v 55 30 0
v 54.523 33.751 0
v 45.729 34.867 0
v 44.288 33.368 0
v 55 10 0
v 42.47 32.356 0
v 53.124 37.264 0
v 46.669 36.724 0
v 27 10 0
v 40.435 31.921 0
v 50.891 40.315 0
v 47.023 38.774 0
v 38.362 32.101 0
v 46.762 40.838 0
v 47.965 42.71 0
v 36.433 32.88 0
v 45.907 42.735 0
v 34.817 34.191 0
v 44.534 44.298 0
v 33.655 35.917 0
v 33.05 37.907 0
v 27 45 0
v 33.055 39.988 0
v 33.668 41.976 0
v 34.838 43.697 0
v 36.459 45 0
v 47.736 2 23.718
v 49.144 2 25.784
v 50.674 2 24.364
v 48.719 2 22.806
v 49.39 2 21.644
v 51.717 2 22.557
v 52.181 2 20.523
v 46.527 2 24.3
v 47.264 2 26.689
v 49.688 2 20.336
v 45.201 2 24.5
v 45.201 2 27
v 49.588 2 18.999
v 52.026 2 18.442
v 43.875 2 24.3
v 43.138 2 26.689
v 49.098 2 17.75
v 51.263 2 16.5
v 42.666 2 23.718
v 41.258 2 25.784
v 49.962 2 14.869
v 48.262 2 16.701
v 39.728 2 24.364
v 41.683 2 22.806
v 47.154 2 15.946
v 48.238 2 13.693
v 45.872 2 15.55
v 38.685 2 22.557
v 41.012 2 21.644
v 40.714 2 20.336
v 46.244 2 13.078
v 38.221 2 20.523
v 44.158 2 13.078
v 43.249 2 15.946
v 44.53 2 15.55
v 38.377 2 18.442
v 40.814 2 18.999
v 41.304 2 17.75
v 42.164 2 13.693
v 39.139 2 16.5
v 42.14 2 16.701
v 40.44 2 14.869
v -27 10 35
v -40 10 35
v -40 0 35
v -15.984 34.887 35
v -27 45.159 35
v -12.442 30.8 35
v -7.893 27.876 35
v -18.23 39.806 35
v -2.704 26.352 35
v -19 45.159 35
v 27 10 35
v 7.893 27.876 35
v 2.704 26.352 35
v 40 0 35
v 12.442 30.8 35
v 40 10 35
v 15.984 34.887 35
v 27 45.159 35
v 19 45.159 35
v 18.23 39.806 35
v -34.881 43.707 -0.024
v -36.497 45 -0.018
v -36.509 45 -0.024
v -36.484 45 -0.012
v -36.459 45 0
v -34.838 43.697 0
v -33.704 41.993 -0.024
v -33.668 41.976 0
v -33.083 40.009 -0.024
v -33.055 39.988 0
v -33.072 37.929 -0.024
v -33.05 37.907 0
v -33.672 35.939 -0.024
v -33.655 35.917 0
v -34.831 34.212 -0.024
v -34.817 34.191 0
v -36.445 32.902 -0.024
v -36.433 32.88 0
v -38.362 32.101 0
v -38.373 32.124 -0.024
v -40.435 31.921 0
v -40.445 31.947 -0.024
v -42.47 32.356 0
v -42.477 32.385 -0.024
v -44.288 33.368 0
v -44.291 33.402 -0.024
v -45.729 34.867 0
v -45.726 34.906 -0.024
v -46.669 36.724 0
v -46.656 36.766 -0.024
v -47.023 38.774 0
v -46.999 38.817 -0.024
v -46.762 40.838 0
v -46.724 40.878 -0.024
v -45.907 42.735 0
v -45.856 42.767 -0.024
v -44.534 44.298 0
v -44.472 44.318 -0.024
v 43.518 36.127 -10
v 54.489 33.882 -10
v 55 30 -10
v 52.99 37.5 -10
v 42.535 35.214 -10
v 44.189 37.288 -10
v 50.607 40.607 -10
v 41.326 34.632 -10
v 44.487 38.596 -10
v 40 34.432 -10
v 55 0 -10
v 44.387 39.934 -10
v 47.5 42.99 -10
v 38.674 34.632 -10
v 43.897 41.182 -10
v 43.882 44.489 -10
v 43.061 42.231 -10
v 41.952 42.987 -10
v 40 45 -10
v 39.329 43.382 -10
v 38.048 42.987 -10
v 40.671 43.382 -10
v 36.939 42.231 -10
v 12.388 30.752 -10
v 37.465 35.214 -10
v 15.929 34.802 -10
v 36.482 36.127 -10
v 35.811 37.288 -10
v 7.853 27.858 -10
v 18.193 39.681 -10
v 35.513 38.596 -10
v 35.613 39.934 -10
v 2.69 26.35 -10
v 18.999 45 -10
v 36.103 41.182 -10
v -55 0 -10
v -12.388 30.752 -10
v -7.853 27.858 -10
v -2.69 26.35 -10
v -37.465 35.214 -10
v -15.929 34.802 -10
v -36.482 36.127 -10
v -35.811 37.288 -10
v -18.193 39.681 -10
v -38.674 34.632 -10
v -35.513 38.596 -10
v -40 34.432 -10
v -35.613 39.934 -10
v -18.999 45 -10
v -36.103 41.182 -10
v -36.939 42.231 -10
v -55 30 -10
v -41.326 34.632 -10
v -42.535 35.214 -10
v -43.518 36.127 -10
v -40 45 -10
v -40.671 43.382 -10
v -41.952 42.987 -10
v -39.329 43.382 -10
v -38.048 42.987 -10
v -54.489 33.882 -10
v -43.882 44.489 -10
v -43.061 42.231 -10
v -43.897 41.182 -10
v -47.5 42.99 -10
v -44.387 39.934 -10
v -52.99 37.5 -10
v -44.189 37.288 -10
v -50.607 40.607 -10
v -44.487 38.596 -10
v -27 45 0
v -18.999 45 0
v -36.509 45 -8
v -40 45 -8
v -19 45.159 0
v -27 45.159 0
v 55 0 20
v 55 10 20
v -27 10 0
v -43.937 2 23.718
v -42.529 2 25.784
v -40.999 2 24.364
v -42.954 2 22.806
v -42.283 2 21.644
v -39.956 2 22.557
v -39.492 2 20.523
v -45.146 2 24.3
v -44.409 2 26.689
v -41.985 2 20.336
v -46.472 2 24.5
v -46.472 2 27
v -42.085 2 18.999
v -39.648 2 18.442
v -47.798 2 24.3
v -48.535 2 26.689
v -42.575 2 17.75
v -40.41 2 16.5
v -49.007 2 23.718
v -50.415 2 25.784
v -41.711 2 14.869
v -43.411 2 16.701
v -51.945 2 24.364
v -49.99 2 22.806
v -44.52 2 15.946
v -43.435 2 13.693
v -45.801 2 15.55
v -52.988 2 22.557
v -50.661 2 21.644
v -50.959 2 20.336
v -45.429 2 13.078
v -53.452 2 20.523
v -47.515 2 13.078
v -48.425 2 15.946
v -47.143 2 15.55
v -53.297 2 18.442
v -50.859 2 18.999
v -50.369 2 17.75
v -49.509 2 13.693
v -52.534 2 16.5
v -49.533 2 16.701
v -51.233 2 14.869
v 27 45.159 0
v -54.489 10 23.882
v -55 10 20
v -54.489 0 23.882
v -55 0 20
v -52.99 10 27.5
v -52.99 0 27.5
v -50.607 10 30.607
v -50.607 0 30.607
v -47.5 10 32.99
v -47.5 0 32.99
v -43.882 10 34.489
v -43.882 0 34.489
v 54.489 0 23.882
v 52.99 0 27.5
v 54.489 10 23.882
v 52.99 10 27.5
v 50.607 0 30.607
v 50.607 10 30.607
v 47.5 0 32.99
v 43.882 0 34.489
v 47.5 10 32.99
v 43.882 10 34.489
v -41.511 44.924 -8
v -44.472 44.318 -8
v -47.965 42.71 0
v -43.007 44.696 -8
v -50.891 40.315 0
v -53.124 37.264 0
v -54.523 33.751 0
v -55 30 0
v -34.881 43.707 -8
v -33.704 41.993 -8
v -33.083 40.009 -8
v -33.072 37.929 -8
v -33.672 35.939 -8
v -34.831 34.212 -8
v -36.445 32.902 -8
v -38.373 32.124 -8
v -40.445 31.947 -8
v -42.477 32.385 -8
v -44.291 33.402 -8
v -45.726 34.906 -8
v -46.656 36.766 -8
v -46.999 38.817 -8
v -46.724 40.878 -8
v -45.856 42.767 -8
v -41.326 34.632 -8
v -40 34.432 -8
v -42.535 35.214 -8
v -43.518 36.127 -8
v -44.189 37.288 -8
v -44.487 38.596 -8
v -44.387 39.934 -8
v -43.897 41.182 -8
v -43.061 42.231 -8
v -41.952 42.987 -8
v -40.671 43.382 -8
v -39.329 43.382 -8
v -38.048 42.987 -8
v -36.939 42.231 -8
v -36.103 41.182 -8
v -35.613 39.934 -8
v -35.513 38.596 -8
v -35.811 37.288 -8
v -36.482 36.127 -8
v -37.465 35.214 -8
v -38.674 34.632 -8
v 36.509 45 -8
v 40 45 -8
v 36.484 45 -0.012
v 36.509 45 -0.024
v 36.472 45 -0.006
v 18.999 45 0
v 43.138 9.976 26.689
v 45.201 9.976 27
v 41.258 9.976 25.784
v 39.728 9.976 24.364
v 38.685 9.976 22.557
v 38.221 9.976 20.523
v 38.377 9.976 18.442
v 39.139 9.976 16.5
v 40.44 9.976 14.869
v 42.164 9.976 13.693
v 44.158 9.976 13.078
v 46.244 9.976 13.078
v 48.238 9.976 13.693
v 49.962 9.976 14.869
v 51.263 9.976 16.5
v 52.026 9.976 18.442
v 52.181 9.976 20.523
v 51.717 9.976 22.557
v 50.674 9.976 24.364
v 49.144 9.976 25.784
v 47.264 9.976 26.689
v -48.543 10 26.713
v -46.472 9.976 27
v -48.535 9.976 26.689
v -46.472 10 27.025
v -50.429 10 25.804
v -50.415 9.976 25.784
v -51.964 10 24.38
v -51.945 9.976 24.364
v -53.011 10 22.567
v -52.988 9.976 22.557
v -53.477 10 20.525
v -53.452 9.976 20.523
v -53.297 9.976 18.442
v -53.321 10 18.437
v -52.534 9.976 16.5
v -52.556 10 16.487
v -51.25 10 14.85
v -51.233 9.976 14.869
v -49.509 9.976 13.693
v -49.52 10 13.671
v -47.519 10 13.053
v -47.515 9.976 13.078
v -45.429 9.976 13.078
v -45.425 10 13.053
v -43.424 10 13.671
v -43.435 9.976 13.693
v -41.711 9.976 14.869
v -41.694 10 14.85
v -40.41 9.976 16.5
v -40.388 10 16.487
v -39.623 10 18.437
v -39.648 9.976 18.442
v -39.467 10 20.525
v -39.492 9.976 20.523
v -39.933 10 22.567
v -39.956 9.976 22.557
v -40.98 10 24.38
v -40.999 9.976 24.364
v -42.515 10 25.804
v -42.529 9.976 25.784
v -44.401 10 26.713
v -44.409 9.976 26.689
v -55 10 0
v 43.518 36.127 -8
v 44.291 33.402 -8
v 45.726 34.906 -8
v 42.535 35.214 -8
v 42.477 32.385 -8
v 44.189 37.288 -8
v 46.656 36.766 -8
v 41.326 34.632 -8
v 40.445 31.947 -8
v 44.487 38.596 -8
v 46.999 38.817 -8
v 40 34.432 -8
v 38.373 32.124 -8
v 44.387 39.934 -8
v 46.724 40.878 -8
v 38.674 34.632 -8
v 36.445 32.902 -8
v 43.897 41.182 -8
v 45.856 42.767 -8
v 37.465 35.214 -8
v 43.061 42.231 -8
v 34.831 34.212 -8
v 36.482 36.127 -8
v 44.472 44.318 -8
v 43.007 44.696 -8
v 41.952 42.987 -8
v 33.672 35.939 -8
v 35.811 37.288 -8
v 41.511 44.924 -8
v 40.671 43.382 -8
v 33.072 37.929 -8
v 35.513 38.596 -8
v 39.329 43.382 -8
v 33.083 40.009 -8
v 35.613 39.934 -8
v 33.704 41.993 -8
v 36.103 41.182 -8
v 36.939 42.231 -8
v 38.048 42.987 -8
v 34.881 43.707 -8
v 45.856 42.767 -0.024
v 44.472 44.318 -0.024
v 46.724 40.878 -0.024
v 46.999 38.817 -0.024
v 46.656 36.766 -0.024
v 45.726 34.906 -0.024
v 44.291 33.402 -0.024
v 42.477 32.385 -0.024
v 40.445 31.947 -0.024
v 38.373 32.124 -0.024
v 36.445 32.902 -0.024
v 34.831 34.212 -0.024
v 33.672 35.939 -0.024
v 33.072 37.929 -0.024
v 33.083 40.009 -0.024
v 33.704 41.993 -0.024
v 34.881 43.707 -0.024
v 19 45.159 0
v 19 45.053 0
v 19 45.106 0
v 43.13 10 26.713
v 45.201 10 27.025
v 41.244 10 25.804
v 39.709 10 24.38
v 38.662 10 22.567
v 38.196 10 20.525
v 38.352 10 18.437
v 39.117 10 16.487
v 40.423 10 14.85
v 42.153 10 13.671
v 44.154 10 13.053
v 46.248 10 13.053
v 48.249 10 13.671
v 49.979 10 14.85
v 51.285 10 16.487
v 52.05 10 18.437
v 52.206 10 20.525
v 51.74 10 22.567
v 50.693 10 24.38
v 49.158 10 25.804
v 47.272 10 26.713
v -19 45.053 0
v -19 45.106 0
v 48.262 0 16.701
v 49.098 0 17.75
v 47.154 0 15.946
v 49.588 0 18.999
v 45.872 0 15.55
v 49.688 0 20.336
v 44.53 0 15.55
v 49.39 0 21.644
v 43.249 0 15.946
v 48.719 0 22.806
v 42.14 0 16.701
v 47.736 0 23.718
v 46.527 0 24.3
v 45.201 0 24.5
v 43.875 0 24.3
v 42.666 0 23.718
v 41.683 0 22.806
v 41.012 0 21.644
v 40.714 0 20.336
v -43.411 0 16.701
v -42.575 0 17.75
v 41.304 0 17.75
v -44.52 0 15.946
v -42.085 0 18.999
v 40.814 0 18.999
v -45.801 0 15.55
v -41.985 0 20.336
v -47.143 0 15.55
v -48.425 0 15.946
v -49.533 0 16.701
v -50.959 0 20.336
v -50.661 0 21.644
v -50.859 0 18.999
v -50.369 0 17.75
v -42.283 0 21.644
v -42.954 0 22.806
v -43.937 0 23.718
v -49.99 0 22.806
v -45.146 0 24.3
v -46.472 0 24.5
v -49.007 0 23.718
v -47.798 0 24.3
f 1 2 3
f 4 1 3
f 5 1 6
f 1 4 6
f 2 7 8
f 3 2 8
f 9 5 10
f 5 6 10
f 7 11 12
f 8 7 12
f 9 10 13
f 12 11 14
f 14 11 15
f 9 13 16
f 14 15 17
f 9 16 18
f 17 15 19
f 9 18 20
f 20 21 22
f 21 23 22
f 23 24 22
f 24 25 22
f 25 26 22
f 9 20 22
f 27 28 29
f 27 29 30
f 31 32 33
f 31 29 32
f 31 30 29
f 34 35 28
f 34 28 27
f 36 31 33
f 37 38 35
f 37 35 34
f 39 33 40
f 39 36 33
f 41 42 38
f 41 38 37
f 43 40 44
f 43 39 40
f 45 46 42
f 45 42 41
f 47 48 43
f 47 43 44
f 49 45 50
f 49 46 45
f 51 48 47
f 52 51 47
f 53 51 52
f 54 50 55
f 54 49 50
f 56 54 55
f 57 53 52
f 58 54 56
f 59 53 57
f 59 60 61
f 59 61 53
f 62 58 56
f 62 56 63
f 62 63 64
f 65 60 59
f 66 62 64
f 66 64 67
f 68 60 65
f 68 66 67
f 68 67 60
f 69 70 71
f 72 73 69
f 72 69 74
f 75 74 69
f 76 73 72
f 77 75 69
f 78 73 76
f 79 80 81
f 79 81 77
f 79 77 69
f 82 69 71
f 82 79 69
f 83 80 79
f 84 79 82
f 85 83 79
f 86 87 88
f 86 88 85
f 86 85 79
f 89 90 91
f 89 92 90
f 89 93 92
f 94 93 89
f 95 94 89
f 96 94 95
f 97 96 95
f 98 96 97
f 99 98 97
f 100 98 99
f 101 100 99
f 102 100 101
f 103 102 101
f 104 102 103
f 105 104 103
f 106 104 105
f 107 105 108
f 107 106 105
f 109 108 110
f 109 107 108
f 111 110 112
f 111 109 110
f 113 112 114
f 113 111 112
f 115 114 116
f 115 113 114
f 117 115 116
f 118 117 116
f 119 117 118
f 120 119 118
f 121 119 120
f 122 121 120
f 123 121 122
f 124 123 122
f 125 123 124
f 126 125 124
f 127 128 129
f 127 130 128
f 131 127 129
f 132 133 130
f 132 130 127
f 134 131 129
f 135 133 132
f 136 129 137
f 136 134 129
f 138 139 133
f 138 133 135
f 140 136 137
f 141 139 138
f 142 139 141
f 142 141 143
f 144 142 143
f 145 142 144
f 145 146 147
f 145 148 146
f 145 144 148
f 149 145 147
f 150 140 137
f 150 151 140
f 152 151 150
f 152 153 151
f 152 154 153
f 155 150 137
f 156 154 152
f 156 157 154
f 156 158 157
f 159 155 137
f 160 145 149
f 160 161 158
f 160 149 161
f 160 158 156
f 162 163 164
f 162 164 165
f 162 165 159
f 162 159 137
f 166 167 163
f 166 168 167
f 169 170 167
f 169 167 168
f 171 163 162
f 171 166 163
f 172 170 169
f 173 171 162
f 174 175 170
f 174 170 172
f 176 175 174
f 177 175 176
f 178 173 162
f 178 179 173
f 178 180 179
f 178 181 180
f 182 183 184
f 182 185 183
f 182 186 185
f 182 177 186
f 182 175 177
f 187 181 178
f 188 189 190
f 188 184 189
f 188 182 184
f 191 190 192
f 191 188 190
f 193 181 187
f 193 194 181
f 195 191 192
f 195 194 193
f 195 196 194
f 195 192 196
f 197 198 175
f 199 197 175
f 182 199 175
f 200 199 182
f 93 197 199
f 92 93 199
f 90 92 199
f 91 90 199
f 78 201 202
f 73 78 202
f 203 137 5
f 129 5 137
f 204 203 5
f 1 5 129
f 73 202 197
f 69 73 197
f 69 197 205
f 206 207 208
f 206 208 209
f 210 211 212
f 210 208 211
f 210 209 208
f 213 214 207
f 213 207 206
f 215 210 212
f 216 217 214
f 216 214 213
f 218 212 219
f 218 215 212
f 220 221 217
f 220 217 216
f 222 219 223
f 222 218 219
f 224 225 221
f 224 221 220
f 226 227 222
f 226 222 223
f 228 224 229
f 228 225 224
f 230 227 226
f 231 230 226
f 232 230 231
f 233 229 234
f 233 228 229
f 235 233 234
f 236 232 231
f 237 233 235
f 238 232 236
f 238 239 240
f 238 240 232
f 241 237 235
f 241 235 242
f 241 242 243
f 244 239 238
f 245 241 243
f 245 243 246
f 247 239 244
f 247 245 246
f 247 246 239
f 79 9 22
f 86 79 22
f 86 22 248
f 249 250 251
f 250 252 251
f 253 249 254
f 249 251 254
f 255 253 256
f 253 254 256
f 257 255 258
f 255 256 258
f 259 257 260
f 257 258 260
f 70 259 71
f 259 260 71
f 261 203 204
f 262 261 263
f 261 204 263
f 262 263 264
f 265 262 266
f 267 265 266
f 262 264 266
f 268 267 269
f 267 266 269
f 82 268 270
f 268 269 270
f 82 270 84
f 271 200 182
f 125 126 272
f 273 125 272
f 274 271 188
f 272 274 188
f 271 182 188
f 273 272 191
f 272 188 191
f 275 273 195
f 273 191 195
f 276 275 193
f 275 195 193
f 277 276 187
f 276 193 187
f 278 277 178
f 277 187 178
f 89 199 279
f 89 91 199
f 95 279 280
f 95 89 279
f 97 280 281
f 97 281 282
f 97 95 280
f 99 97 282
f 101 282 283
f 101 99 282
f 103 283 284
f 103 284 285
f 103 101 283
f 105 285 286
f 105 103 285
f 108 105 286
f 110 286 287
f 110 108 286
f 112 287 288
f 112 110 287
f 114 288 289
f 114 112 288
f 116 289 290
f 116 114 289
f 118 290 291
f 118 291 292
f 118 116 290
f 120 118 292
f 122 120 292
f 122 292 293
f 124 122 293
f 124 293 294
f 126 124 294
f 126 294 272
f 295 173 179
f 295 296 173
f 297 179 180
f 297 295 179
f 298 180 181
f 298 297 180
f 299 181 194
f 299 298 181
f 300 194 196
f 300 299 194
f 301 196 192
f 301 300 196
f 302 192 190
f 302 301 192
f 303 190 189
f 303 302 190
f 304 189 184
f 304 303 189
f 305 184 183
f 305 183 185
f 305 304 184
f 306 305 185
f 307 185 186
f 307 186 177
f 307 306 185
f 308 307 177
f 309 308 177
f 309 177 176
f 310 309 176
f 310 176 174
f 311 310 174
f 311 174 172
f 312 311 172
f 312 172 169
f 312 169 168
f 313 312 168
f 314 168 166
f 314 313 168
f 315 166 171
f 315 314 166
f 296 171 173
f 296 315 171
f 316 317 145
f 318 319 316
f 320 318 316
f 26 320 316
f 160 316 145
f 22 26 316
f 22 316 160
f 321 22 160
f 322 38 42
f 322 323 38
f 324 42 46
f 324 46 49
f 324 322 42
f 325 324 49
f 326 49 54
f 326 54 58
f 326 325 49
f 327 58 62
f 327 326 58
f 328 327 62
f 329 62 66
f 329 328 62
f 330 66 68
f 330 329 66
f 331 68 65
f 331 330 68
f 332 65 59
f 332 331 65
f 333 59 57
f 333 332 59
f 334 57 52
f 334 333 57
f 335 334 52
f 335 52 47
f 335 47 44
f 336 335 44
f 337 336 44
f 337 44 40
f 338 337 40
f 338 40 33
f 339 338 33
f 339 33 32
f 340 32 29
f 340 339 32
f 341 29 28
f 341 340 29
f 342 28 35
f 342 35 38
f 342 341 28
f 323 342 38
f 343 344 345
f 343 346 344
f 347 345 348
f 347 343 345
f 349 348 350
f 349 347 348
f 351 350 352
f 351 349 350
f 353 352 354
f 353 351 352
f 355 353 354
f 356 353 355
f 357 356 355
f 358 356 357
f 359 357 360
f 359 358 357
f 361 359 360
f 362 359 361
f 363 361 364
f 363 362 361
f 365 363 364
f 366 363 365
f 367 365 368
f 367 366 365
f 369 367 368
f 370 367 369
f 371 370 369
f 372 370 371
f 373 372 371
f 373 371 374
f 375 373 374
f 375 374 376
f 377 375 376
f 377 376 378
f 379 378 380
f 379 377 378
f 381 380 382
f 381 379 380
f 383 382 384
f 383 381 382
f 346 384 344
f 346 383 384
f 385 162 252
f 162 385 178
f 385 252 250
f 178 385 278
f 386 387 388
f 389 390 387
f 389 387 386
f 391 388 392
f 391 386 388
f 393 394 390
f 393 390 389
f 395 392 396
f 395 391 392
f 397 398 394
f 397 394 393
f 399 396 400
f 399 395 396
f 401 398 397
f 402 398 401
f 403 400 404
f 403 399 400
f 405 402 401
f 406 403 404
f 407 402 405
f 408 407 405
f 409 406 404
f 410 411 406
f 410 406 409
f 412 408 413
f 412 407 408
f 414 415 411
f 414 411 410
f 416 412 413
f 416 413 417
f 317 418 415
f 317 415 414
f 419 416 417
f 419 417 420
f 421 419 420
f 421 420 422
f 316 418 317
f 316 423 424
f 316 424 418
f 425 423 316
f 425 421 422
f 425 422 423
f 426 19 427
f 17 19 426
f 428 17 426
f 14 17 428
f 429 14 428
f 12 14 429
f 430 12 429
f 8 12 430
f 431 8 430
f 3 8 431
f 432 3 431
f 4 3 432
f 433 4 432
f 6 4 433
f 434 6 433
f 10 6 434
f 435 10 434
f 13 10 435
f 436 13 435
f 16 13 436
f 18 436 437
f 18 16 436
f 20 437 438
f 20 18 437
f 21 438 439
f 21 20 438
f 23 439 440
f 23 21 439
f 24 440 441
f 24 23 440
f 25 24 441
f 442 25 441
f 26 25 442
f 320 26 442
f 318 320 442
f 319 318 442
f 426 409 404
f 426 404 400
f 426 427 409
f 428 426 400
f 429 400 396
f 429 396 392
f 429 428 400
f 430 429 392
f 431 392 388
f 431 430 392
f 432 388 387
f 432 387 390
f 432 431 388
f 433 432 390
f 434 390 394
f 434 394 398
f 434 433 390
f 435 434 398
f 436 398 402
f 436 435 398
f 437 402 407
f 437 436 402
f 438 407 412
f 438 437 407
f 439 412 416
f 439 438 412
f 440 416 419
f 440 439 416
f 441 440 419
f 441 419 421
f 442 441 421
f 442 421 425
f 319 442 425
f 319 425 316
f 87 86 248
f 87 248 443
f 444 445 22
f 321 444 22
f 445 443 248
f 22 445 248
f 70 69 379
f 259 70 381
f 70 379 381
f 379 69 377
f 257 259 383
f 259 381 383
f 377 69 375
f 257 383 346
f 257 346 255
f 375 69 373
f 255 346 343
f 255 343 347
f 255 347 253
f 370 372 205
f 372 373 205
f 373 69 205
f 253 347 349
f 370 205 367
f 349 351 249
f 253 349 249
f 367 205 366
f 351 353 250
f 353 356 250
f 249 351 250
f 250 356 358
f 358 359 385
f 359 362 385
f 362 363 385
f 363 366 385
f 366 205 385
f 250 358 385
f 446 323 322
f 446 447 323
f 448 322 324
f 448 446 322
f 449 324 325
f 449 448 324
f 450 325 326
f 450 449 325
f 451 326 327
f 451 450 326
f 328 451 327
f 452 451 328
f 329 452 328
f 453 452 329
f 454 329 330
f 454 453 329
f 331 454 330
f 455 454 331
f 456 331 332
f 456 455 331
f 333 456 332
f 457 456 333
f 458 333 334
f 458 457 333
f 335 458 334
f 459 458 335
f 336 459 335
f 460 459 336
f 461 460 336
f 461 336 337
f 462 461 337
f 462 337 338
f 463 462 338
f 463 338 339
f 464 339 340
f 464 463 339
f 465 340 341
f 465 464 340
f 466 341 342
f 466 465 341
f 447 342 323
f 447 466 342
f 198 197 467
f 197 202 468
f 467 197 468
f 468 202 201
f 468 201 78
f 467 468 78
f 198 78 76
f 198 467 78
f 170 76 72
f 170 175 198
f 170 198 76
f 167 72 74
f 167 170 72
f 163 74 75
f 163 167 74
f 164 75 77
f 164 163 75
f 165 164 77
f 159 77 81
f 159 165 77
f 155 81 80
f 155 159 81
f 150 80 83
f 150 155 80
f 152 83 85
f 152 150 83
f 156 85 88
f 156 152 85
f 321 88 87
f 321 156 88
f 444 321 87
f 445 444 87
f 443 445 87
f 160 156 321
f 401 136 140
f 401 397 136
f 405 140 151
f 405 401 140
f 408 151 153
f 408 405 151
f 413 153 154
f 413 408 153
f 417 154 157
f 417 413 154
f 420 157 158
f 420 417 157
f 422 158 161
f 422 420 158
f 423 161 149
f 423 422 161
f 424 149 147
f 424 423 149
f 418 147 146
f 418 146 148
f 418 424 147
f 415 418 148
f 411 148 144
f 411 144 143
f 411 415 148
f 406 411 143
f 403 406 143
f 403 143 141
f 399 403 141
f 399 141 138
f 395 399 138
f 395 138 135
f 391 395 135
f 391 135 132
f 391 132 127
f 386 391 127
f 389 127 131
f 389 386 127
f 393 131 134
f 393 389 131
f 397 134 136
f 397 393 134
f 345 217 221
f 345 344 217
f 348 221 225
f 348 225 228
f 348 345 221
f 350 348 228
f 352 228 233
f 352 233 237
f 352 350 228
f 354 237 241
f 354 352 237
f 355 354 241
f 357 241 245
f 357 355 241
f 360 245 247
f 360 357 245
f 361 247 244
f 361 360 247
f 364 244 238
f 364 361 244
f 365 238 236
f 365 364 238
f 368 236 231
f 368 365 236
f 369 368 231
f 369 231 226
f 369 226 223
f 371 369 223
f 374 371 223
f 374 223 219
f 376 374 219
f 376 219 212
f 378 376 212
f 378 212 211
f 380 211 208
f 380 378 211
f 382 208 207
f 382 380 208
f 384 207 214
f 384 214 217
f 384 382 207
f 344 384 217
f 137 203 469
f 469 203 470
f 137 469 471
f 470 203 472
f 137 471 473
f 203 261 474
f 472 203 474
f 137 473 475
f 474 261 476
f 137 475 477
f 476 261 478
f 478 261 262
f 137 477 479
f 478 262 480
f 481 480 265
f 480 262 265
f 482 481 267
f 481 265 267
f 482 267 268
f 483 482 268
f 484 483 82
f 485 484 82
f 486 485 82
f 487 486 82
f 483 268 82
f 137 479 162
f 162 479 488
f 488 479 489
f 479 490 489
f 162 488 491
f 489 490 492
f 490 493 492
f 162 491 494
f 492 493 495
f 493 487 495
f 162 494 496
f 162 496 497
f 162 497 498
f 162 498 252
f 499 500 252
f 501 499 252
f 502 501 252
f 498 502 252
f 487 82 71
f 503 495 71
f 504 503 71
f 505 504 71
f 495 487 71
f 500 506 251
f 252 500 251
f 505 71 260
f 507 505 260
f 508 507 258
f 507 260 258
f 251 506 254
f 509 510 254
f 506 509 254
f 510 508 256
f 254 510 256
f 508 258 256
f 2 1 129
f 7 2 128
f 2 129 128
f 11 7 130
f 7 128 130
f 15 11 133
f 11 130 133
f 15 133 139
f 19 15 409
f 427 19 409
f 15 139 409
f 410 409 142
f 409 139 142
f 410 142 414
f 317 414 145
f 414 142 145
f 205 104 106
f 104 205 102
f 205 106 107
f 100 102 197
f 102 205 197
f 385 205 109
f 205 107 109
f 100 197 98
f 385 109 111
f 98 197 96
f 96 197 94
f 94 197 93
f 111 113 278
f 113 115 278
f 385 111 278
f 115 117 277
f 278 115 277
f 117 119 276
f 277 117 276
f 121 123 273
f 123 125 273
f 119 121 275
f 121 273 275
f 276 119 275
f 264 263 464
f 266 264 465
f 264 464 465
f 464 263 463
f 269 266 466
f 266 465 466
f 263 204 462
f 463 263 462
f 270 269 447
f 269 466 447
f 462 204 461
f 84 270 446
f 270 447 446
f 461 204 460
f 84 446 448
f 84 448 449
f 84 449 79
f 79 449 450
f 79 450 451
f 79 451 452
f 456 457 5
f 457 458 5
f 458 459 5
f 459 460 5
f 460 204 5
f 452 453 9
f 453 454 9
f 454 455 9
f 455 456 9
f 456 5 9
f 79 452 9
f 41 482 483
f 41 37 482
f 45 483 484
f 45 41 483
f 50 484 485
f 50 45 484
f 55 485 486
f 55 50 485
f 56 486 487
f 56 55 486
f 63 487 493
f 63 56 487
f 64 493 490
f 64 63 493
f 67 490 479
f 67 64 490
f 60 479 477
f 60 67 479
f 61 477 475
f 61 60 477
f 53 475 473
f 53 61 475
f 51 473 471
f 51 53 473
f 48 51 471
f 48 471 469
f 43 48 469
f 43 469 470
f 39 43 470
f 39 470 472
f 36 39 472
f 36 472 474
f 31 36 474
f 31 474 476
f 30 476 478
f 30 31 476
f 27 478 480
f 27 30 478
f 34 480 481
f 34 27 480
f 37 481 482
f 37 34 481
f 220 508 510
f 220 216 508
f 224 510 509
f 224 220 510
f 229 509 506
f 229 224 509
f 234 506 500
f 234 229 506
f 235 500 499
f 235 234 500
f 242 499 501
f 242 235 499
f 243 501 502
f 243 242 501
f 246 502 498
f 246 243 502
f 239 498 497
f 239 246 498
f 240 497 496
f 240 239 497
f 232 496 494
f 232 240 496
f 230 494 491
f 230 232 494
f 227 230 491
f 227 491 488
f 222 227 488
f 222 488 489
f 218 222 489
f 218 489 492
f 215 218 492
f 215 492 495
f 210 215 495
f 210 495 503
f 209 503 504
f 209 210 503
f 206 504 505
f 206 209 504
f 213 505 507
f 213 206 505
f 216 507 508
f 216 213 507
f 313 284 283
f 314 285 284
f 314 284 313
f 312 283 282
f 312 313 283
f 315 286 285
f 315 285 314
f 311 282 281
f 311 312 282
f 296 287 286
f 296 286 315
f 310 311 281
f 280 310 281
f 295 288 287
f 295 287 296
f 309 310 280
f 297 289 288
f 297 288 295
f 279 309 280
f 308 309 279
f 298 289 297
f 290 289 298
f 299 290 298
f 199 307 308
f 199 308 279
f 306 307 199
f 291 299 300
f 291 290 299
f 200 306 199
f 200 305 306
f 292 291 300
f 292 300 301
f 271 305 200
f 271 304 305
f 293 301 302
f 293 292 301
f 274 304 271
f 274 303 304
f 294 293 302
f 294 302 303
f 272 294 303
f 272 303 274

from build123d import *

# Parameters (mm, degrees)
EXTRUDE_1_DEPTH          = 35
SKETCH_2_W               = 110
SKETCH_2_H               = 45
EXTRUDE_2_DEPTH          = 10
CUT_EXTRUDE_1_DEPTH      = 85.198125322
CUT_EXTRUDE_1_DEPTH_BACK = 85.198125322
CUT_EXTRUDE_2_DEPTH      = 50
FILLET_2_R               = 15


with BuildPart() as part:
    # 스케치1 → 보스-돌출1 (new body)
    with BuildSketch(Plane.XY):
        Polygon((-55, 0), (55, 0), (55, 10), (27, 10), (27, 45.158878505), (-27, 45.158878505), (-27, 10), (-55, 10), align=None)
    extrude(amount=EXTRUDE_1_DEPTH)

    # 스케치2 → 보스-돌출2 (add)
    with BuildSketch(Plane(origin=(0, 0, 0), x_dir=(-1, 0, 0), z_dir=(0, 0, -1))):
        with Locations((0, 22.5)):
            Rectangle(SKETCH_2_W, SKETCH_2_H)
    extrude(amount=EXTRUDE_2_DEPTH)

    # 스케치3 → 컷-돌출1 (cut, two sides: drawn at the far end of the back side and taken through both)
    with BuildSketch(Plane.XY.offset(35).offset(-CUT_EXTRUDE_1_DEPTH_BACK)):
        with BuildLine():
            ThreePointArc((-16, 45.158878505), (0, 29.158878505), (16, 45.158878505))
            Line((16, 45.158878505), (-16, 45.158878505))
        make_face()
    extrude(amount=CUT_EXTRUDE_1_DEPTH + CUT_EXTRUDE_1_DEPTH_BACK, mode=Mode.SUBTRACT)

    # 스케치4 → 컷-돌출2 (cut)
    with BuildSketch(Plane(origin=(0, 0, -10), x_dir=(-1, 0, 0), z_dir=(0, 0, -1))):
        with BuildLine():
            Line((-19, 45.158878505), (19, 45.158878505))
            ThreePointArc((19, 45.158878505), (0, 26.158878505), (-19, 45.158878505))
        make_face()
    extrude(amount=-CUT_EXTRUDE_2_DEPTH, mode=Mode.SUBTRACT)

    # 스케치12 → M8 소켓 머리 캡 나사용 카운터보어5 (revolve, cut)
    with BuildSketch(Plane(origin=(-40, 38.932438824, 0), x_dir=(0, -1, 0), z_dir=(1, 0, 0))):
        Polygon((0, 0), (0, 10), (4.5, 10), (4.5, 8), (7, 8), (7, 0.024142219), (7.025, 0), align=None)
    revolve(axis=Axis((-40, 38.932438824, 6.35), (0, 0, -1)), mode=Mode.SUBTRACT)

    # 스케치13 → M8 소켓 머리 캡 나사용 카운터보어4 (revolve, cut)
    with BuildSketch(Plane(origin=(-46.472033472, 10, 20), x_dir=(0, 0, 1), z_dir=(1, 0, 0))):
        Polygon((0, 0), (0, 10), (4.5, 10), (4.5, 8), (7, 8), (7, 0.024142219), (7.025, 0), align=None)
    revolve(axis=Axis((-46.472033472, 16.35, 20), (0, -1, 0)), mode=Mode.SUBTRACT)

    # 스케치15 → M8 소켓 머리 캡 나사용 카운터보어3 (revolve, cut)
    with BuildSketch(Plane(origin=(45.201027452, 10, 20), x_dir=(0, 0, 1), z_dir=(1, 0, 0))):
        Polygon((0, 0), (0, 10), (4.5, 10), (4.5, 8), (7, 8), (7, 0.024142219), (7.025, 0), align=None)
    revolve(axis=Axis((45.201027452, 16.35, 20), (0, -1, 0)), mode=Mode.SUBTRACT)

    # 스케치16 → M8 소켓 머리 캡 나사용 카운터보어6 (revolve, cut)
    with BuildSketch(Plane(origin=(40, 38.932438824, 0), x_dir=(0, -1, 0), z_dir=(1, 0, 0))):
        Polygon((0, 0), (0, 10), (4.5, 10), (4.5, 8), (7, 8), (7, 0.024142219), (7.025, 0), align=None)
    revolve(axis=Axis((40, 38.932438824, 6.35), (0, 0, -1)), mode=Mode.SUBTRACT)

    # 필렛2
    fillet_2_edges = [part.edges().sort_by_distance(p)[0] for p in [
        (-55, 45, -5),
        (55, 45, -5),
        (55, 5, 35),
        (-55, 5, 35),
    ]]
    fillet(fillet_2_edges, radius=FILLET_2_R)


solid = part.part
